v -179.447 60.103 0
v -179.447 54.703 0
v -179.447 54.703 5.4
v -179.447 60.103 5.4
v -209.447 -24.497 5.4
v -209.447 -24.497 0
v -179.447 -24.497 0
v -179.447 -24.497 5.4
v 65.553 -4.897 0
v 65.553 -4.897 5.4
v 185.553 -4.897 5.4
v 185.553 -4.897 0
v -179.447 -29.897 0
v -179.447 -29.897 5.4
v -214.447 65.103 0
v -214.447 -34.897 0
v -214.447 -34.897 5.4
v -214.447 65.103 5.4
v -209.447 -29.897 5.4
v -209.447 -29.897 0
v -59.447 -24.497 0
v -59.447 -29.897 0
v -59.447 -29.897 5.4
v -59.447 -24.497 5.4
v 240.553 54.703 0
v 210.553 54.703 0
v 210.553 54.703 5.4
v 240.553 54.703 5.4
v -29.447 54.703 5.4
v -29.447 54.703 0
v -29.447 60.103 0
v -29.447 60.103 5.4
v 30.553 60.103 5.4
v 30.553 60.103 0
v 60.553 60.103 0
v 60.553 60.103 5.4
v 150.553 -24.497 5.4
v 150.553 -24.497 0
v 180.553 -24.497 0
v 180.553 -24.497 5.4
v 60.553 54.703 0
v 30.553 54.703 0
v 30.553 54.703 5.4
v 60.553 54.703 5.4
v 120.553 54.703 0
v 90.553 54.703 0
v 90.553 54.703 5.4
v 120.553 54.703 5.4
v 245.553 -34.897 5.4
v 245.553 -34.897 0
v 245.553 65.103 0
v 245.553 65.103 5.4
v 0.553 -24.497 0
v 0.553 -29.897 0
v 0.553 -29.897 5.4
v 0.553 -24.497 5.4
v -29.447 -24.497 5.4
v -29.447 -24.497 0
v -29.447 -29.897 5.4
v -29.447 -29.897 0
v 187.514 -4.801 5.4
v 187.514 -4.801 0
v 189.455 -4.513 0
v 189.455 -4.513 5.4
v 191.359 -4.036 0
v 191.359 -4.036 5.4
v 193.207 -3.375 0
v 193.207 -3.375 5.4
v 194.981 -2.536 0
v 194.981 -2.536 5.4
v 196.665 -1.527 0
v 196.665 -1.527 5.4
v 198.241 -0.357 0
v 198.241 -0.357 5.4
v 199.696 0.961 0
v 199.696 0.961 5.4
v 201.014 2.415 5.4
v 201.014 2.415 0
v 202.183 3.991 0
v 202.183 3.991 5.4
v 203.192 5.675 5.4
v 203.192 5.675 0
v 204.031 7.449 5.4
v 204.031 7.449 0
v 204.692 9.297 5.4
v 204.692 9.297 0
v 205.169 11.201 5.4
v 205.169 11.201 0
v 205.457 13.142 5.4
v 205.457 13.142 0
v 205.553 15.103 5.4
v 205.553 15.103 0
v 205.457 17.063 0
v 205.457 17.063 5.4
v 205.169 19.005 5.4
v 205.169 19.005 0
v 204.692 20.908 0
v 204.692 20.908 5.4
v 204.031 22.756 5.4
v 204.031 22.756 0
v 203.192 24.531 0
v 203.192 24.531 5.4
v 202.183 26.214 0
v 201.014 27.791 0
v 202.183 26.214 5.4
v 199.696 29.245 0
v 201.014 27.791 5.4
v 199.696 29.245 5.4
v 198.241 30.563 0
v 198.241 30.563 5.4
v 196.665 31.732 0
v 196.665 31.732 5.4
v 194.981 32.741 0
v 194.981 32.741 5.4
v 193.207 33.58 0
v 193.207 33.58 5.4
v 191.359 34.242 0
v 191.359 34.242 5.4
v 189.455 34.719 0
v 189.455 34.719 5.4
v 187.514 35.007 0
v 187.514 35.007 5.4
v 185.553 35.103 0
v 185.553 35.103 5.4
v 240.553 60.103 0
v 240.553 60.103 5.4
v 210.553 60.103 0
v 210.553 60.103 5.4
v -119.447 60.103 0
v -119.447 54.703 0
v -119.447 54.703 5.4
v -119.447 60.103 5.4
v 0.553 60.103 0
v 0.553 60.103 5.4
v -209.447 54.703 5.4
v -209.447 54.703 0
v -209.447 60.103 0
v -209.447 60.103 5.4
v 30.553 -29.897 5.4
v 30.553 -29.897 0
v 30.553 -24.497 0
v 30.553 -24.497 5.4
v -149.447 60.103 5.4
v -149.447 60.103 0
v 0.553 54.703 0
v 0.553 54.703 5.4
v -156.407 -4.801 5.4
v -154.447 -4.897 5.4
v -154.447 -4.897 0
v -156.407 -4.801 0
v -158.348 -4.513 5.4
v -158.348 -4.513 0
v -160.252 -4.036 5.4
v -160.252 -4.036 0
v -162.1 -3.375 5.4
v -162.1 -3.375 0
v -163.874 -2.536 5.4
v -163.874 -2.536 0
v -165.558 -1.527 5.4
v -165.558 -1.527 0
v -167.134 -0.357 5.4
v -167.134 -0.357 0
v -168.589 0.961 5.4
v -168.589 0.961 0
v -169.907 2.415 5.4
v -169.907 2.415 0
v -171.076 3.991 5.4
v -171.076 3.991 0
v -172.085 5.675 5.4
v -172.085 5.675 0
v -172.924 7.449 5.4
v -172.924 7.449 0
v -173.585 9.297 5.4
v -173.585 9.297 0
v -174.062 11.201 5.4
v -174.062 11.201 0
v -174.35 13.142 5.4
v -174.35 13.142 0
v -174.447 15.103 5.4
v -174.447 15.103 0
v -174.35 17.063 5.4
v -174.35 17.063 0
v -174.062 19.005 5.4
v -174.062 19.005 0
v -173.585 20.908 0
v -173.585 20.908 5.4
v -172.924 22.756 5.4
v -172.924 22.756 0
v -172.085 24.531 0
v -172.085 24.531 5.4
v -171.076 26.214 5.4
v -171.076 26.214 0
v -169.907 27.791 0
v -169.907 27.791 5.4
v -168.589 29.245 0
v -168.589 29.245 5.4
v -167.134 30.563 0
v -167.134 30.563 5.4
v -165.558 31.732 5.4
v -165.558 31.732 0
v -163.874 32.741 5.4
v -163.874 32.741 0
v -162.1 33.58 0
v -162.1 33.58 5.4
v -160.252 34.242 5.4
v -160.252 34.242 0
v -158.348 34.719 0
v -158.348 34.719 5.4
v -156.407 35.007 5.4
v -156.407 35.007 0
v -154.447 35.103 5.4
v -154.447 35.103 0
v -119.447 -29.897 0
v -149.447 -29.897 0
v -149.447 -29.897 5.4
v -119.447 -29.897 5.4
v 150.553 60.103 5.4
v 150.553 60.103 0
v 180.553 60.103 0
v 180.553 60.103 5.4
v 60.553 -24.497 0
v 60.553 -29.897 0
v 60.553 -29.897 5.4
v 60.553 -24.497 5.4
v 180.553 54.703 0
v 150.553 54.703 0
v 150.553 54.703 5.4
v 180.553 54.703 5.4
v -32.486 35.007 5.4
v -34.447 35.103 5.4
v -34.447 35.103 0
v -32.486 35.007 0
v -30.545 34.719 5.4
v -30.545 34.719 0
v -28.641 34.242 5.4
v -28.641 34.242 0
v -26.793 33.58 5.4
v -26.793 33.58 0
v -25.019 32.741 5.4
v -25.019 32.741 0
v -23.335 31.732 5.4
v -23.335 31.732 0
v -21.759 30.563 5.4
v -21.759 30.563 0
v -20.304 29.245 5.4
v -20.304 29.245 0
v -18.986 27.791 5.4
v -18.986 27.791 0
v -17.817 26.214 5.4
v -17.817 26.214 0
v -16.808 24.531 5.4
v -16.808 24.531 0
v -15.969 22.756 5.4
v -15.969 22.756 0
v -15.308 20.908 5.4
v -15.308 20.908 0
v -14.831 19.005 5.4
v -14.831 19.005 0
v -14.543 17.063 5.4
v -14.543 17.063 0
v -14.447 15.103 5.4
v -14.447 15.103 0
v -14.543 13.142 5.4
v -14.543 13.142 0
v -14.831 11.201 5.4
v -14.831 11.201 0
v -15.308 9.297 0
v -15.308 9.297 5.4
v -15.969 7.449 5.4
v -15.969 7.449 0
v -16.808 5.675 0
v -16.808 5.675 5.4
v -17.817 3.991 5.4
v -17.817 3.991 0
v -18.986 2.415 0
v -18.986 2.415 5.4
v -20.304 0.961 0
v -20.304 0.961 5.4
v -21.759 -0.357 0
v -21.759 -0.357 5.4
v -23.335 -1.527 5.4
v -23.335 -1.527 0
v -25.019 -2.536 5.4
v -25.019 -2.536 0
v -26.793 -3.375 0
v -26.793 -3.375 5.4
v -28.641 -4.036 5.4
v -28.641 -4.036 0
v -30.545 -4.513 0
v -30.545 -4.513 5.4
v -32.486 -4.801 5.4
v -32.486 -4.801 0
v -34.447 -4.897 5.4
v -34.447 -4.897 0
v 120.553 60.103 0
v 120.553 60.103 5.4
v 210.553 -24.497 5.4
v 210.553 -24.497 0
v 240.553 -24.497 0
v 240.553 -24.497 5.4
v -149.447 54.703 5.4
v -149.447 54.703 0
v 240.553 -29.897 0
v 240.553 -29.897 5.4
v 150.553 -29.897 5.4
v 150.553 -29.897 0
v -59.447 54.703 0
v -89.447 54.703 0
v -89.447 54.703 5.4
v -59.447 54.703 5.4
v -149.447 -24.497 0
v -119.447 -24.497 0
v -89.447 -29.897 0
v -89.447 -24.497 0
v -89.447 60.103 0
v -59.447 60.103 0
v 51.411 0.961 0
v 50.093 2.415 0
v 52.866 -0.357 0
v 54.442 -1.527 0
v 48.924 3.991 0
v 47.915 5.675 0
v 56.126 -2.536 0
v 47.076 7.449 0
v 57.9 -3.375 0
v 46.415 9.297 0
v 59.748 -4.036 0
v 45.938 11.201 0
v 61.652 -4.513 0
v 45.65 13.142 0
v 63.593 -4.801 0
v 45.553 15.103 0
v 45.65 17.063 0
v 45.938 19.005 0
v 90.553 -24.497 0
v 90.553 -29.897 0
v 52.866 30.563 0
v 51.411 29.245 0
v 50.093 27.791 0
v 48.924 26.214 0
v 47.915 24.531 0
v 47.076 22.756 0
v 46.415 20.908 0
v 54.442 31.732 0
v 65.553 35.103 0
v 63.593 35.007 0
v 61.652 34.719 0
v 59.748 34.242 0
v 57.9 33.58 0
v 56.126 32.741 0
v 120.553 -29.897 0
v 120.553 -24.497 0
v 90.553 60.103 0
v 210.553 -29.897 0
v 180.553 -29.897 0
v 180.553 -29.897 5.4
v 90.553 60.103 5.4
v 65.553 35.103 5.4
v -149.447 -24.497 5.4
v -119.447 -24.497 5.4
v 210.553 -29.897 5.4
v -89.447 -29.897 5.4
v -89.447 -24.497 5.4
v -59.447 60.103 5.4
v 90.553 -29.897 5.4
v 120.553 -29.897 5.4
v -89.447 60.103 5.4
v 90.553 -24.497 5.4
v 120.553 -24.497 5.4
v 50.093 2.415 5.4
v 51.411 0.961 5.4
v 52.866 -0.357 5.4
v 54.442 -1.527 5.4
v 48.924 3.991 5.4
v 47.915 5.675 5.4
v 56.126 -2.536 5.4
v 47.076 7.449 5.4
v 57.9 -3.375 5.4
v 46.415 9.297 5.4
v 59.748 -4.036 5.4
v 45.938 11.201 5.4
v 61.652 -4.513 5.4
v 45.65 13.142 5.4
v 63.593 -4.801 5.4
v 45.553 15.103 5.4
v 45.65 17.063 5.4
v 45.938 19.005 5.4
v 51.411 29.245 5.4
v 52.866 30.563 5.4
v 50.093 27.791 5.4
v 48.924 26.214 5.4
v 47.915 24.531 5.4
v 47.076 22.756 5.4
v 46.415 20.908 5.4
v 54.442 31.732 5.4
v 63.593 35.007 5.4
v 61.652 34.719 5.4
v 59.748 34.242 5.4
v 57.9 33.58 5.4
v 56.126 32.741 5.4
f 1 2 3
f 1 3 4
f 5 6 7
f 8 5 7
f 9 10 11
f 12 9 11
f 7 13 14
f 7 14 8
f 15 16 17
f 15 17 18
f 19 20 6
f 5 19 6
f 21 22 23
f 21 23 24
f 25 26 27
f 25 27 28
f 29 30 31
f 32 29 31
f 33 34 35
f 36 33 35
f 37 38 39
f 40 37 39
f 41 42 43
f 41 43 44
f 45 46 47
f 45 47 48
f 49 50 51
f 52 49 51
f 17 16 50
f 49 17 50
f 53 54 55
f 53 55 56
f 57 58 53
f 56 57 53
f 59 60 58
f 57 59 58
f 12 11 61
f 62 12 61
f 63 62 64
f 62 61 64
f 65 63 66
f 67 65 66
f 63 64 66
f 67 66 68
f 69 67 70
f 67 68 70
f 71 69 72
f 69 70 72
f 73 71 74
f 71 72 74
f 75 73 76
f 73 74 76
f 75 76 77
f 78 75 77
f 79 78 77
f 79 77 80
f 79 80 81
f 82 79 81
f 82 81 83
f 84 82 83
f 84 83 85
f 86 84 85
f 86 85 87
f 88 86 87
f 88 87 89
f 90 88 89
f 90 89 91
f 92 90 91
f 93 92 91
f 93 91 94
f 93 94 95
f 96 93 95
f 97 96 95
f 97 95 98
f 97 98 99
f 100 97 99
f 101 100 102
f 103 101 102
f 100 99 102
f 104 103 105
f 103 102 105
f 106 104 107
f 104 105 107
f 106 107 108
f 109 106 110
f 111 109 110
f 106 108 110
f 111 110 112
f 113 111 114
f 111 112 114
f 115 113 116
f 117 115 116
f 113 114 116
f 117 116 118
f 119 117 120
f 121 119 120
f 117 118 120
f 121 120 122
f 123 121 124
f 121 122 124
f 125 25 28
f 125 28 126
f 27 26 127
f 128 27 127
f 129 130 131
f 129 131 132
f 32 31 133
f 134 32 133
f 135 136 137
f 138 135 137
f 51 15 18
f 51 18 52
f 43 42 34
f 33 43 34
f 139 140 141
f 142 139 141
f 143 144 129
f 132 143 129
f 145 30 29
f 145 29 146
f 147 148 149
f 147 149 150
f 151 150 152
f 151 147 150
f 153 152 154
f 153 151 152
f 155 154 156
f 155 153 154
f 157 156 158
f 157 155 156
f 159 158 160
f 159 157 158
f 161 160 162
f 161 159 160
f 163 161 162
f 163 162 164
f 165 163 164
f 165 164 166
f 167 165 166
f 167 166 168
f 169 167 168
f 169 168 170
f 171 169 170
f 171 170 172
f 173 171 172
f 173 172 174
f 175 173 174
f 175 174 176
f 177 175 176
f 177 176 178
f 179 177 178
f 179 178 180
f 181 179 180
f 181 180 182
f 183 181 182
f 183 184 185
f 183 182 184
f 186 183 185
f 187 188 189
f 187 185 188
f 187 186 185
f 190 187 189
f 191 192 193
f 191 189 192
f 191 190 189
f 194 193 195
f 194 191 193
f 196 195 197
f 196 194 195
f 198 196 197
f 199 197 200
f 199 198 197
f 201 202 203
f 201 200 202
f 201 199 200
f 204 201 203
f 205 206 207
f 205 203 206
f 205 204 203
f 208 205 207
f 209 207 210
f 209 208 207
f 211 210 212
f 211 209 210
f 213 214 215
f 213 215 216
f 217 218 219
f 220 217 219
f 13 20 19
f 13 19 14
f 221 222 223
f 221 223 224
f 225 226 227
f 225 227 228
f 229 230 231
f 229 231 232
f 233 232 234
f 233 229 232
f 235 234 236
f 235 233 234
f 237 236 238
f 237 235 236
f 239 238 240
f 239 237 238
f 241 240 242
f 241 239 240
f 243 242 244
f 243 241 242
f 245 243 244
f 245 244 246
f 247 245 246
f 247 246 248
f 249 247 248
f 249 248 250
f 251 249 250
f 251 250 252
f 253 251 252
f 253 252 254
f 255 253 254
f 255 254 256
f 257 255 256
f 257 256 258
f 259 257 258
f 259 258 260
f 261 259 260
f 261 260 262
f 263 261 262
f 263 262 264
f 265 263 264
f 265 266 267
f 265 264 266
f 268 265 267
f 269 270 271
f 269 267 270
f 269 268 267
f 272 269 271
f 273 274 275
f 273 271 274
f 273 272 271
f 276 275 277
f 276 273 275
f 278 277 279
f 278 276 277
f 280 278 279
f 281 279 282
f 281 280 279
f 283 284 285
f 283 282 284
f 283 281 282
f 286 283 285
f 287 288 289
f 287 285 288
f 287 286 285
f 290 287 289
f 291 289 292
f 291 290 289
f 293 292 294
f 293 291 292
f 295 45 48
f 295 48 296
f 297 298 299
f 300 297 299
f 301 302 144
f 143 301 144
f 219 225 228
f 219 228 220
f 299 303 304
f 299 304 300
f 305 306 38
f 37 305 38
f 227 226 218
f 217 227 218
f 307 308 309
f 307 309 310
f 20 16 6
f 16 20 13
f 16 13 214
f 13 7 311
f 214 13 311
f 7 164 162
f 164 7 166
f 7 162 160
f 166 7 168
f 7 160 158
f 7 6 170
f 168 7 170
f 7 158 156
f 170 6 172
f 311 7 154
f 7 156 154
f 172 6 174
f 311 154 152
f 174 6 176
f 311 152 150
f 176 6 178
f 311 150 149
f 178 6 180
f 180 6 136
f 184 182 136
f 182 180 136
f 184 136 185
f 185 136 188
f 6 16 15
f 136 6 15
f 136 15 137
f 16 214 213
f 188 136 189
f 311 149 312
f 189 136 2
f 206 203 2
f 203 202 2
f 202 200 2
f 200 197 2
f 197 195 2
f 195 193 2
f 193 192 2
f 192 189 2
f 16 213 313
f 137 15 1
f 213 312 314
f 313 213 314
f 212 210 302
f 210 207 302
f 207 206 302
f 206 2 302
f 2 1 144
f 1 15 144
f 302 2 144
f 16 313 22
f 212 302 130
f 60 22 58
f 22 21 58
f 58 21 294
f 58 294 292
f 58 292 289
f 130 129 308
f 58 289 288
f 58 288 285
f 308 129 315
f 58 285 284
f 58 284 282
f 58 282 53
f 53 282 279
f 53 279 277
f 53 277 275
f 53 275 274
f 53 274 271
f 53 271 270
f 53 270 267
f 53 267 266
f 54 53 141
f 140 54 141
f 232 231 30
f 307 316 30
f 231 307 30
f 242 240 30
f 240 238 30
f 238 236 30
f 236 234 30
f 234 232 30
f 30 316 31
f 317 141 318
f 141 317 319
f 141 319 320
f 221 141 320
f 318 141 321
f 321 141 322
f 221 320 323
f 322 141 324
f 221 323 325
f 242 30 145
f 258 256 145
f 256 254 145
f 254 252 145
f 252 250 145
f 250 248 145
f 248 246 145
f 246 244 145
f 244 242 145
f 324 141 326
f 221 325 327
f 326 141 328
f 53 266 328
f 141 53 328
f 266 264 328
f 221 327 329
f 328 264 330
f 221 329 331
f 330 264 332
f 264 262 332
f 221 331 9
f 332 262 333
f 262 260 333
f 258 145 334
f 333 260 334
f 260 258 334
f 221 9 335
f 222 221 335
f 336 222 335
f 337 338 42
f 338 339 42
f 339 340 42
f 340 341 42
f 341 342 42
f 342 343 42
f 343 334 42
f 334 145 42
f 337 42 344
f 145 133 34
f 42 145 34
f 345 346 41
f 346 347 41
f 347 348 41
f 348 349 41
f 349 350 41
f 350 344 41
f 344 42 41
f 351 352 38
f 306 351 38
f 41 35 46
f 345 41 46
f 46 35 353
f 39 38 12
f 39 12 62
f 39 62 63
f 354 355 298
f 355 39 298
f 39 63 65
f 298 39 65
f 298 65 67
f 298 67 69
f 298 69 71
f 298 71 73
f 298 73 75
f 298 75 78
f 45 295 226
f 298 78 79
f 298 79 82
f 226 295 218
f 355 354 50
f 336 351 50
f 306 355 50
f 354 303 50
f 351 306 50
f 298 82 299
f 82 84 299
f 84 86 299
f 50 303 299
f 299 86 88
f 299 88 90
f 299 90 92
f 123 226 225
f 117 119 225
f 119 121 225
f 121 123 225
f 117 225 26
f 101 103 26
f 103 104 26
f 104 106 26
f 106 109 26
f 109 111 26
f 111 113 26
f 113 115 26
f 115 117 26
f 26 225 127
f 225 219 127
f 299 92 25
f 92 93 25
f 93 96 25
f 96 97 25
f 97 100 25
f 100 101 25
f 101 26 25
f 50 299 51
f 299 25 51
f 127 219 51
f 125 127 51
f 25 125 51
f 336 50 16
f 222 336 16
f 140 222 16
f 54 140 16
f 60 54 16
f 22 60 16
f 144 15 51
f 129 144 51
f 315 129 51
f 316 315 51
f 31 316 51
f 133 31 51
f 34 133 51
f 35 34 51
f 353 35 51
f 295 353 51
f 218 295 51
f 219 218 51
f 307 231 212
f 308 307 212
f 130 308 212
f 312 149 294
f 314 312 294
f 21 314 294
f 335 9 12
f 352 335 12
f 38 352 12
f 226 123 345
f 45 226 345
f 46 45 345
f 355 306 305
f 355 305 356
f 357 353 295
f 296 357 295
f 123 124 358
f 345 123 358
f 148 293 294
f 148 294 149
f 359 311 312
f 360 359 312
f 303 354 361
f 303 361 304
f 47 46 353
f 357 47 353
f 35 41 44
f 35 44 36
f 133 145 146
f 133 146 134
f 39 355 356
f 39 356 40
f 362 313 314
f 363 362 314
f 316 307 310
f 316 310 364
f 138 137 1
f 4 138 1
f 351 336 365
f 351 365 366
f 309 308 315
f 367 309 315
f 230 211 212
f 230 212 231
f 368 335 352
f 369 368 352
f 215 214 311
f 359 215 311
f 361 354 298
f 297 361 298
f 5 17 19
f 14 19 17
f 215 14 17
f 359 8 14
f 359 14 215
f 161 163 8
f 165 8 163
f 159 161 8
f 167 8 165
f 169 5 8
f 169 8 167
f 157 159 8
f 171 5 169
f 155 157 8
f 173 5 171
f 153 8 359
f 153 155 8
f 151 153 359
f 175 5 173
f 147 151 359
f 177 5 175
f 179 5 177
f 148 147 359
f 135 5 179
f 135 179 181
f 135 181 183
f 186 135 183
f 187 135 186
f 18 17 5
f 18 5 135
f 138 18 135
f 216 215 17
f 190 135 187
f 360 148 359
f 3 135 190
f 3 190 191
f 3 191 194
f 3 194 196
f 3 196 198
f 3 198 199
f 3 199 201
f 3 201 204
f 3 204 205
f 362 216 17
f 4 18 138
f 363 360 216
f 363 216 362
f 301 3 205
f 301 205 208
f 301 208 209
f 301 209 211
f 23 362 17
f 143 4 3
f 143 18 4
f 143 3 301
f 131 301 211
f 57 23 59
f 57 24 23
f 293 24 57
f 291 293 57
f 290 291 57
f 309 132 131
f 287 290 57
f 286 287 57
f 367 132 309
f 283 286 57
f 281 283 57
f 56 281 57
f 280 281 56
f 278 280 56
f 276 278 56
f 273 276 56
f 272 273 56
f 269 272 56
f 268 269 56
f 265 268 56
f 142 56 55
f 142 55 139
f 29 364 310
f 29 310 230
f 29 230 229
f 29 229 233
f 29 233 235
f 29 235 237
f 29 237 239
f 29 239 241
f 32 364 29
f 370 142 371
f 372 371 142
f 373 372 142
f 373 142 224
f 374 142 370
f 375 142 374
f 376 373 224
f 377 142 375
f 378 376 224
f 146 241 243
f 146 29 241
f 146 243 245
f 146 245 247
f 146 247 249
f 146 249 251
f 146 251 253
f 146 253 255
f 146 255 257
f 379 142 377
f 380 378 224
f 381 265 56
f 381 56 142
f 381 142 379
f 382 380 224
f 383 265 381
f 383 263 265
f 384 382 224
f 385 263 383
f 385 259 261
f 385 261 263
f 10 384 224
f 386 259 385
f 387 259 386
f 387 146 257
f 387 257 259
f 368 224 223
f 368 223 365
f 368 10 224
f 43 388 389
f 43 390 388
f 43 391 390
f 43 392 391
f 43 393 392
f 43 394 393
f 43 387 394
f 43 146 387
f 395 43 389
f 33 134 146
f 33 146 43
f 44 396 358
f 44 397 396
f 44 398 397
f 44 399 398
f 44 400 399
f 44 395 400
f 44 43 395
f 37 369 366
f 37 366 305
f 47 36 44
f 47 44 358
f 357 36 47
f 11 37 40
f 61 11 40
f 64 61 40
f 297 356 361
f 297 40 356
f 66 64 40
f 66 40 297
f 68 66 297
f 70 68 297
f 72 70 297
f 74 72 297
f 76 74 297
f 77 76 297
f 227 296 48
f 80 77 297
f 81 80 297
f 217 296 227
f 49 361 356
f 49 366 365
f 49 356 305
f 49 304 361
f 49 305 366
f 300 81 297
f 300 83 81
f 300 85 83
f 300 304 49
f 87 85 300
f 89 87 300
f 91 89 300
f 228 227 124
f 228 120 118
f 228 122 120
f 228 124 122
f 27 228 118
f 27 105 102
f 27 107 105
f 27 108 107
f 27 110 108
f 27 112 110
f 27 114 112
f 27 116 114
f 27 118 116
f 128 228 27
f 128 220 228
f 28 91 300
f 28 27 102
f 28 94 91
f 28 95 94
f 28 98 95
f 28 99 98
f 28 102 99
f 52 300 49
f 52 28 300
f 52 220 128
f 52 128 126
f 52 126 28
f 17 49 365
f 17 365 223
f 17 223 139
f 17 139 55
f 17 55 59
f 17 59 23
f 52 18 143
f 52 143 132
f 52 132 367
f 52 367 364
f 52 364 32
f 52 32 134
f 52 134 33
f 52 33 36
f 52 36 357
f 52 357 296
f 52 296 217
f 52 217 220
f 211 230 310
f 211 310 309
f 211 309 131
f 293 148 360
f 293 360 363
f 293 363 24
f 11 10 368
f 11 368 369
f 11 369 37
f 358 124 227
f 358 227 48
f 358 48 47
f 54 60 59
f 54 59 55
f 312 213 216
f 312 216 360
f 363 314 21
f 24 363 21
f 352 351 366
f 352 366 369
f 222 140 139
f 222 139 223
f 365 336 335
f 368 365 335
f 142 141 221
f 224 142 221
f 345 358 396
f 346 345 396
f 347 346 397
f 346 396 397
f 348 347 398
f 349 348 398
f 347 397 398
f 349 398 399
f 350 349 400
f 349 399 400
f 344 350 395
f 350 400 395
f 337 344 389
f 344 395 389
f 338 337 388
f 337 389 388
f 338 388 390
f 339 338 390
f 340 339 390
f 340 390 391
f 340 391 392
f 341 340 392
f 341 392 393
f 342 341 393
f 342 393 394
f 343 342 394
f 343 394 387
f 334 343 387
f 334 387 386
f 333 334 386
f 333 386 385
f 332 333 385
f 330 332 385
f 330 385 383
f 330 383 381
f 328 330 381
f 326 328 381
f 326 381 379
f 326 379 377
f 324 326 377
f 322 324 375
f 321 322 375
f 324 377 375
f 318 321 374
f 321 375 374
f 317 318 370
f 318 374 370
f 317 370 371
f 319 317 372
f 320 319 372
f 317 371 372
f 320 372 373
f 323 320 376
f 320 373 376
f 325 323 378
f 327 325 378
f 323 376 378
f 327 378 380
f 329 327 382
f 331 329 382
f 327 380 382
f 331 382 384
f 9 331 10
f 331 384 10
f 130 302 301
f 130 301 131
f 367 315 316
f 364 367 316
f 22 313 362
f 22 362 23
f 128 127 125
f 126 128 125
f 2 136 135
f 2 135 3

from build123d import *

# Parameters (mm, degrees)
SKETCH1_W           = 460
SKETCH1_H           = 100
SKETCH1_W_2         = 30
SKETCH1_H_2         = 5.4
BOSS_EXTRUDE1_DEPTH = 5.4
CUT_EXTRUDE1_DEPTH  = 6.4


with BuildPart() as part:
    # Sketch1 → Boss-Extrude1 (new body)
    with BuildSketch(Plane.XY):
        with Locations((15.553483591, 15.102805507)):
            Rectangle(SKETCH1_W, SKETCH1_H)
        with Locations((-134.446516409, 57.402805507)):
            Rectangle(SKETCH1_W_2, SKETCH1_H_2, mode=Mode.SUBTRACT)
        with Locations((-194.446516409, 57.402805507)):
            Rectangle(SKETCH1_W_2, SKETCH1_H_2, mode=Mode.SUBTRACT)
        with Locations((-74.446516409, 57.402805507)):
            Rectangle(SKETCH1_W_2, SKETCH1_H_2, mode=Mode.SUBTRACT)
        with Locations((-14.446516409, 57.402805507)):
            Rectangle(SKETCH1_W_2, SKETCH1_H_2, mode=Mode.SUBTRACT)
        with Locations((45.553483591, 57.402805507)):
            Rectangle(SKETCH1_W_2, SKETCH1_H_2, mode=Mode.SUBTRACT)
        with Locations((105.553483591, 57.402805507)):
            Rectangle(SKETCH1_W_2, SKETCH1_H_2, mode=Mode.SUBTRACT)
        with Locations((165.553483591, 57.402805507)):
            Rectangle(SKETCH1_W_2, SKETCH1_H_2, mode=Mode.SUBTRACT)
        with Locations((225.553483591, 57.402805507)):
            Rectangle(SKETCH1_W_2, SKETCH1_H_2, mode=Mode.SUBTRACT)
        with Locations((225.553483591, -27.197194493)):
            Rectangle(SKETCH1_W_2, SKETCH1_H_2, mode=Mode.SUBTRACT)
        with Locations((165.553483591, -27.197194493)):
            Rectangle(SKETCH1_W_2, SKETCH1_H_2, mode=Mode.SUBTRACT)
        with Locations((105.553483591, -27.197194493)):
            Rectangle(SKETCH1_W_2, SKETCH1_H_2, mode=Mode.SUBTRACT)
        with Locations((45.553483591, -27.197194493)):
            Rectangle(SKETCH1_W_2, SKETCH1_H_2, mode=Mode.SUBTRACT)
        with Locations((-14.446516409, -27.197194493)):
            Rectangle(SKETCH1_W_2, SKETCH1_H_2, mode=Mode.SUBTRACT)
        with Locations((-74.446516409, -27.197194493)):
            Rectangle(SKETCH1_W_2, SKETCH1_H_2, mode=Mode.SUBTRACT)
        with Locations((-134.446516409, -27.197194493)):
            Rectangle(SKETCH1_W_2, SKETCH1_H_2, mode=Mode.SUBTRACT)
        with Locations((-194.446516409, -27.197194493)):
            Rectangle(SKETCH1_W_2, SKETCH1_H_2, mode=Mode.SUBTRACT)
    extrude(amount=BOSS_EXTRUDE1_DEPTH)

    # Sketch2 → Cut-Extrude1 (cut, through all)
    with BuildSketch(Plane.XY.offset(5.4)):
        with BuildLine():
            Line((-154.446516409, 35.102805507), (-34.446516409, 35.102805507))
            ThreePointArc((-34.446516409, 35.102805507), (-14.446516409, 15.102805507), (-34.446516409, -4.897194493))
            Line((-34.446516409, -4.897194493), (-154.446516409, -4.897194493))
            ThreePointArc((-154.446516409, -4.897194493), (-174.446516409, 15.102805507), (-154.446516409, 35.102805507))
        make_face()
        with BuildLine():
            Line((65.553483591, -4.897194493), (185.553483591, -4.897194493))
            ThreePointArc((185.553483591, -4.897194493), (205.553483591, 15.102805507), (185.553483591, 35.102805507))
            Line((185.553483591, 35.102805507), (65.553483591, 35.102805507))
            ThreePointArc((65.553483591, 35.102805507), (45.553483591, 15.102805507), (65.553483591, -4.897194493))
        make_face()
    extrude(amount=-CUT_EXTRUDE1_DEPTH, mode=Mode.SUBTRACT)


solid = part.part
